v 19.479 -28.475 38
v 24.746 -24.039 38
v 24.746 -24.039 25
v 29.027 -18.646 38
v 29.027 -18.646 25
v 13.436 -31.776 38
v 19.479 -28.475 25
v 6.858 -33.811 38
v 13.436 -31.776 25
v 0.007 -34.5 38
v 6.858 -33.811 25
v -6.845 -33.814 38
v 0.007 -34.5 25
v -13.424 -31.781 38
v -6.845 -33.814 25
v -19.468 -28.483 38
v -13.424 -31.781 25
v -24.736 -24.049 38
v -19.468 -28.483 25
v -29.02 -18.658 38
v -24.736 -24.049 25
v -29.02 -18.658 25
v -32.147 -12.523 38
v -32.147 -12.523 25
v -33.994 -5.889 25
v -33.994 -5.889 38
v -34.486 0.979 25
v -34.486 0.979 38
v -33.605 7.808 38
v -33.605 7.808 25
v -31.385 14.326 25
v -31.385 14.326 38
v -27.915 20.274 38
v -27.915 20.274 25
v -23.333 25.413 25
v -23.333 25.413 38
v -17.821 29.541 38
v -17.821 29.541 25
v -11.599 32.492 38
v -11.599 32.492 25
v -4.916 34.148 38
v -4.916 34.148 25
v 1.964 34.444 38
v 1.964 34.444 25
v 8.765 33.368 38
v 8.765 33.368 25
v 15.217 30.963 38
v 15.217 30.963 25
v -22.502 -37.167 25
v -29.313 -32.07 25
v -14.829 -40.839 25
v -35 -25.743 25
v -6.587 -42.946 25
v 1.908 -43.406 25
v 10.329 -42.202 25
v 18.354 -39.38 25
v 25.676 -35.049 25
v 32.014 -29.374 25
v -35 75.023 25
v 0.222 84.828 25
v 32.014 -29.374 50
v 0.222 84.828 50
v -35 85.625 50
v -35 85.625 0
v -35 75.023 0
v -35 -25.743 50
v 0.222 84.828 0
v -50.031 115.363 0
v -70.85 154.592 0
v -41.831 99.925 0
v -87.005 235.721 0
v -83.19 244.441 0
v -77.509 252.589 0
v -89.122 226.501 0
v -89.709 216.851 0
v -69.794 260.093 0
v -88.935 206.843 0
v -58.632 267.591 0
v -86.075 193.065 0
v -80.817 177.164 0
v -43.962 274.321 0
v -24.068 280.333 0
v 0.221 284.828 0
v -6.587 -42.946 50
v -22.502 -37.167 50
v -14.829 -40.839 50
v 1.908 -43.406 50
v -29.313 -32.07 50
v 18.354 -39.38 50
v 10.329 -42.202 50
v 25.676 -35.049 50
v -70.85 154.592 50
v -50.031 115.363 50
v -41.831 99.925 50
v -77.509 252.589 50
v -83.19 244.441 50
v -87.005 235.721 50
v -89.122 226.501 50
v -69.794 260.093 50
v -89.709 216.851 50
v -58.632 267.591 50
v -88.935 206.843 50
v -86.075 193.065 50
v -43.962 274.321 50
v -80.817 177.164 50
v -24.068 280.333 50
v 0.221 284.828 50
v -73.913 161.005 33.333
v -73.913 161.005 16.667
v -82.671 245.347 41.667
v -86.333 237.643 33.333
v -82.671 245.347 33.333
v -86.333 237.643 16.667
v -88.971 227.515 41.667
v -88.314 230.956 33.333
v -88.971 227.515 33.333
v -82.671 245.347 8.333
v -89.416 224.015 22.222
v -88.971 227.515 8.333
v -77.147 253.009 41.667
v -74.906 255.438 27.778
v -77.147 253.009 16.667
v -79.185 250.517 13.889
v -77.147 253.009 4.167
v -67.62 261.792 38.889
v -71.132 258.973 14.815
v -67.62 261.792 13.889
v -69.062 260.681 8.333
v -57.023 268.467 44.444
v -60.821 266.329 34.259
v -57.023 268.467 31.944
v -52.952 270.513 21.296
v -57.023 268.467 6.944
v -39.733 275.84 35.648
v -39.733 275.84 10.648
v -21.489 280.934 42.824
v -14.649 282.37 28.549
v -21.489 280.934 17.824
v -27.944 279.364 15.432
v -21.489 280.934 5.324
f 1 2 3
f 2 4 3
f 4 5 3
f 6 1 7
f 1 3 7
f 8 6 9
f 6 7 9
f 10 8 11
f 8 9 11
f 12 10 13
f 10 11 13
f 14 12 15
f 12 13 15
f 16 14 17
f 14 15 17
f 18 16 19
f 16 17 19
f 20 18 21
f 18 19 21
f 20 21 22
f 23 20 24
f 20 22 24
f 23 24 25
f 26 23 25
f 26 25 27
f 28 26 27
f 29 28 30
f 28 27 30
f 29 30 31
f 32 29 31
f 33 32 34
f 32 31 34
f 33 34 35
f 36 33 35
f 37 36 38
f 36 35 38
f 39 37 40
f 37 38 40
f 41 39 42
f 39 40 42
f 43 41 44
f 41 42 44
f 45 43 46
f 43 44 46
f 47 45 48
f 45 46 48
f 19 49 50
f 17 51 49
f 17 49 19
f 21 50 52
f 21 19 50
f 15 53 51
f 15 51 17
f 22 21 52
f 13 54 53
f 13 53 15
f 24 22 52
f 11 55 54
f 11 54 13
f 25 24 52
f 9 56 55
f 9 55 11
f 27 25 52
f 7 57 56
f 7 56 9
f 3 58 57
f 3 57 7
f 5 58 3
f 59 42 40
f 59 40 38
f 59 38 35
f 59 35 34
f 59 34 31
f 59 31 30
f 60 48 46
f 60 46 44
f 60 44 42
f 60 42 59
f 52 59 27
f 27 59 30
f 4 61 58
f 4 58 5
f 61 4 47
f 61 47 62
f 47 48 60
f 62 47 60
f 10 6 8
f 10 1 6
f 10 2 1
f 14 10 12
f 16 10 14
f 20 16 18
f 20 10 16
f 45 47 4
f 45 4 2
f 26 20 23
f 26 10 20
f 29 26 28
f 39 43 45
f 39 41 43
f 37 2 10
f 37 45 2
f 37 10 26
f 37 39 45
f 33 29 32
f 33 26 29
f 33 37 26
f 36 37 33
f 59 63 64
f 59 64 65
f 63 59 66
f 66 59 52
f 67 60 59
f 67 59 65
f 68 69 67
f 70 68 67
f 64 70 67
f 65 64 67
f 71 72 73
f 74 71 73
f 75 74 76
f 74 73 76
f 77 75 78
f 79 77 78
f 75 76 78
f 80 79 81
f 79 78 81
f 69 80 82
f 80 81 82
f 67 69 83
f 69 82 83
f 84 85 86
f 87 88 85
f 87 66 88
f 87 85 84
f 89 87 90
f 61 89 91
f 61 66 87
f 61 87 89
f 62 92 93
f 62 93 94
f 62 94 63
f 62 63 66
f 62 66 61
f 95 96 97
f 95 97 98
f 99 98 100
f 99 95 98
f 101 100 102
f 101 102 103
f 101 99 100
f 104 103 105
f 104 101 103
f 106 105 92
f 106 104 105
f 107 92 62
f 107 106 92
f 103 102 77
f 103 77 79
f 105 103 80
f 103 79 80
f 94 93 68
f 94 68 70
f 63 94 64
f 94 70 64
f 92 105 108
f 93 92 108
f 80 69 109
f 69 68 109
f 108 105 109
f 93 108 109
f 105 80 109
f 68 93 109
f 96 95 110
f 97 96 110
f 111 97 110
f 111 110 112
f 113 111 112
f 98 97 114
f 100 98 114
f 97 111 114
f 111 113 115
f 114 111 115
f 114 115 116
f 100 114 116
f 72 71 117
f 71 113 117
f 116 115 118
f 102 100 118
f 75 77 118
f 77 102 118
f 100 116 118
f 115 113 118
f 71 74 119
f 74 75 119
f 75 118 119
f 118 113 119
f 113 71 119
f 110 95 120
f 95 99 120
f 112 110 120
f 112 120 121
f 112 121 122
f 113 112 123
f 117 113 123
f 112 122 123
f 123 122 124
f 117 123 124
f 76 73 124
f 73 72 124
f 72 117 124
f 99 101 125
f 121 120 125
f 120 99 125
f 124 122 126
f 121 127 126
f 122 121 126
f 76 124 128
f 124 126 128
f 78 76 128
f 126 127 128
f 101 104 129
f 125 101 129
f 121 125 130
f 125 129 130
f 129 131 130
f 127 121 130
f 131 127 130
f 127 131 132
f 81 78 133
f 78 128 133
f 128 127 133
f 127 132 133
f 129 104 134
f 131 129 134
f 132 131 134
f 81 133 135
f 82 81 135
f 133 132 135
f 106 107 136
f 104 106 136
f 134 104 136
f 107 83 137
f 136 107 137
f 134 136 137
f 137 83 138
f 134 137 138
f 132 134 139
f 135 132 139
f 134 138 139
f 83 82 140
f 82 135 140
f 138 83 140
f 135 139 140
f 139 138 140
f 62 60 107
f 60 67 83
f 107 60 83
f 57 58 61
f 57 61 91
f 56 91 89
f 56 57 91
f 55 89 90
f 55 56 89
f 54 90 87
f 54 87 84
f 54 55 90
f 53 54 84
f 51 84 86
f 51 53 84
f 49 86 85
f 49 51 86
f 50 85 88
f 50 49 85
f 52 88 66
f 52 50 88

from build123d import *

# Parameters (mm, degrees)
BOSS_EXTRUDE1_DEPTH = 50
SKETCH3_W           = 66.376369139
SKETCH3_H           = 188.96079622
CUT_EXTRUDE1_DEPTH  = 305.408240944
SKETCH4_R           = 34.5
CUT_EXTRUDE2_DEPTH  = 13
CUT_EXTRUDE3_DEPTH  = 300.667940806


with BuildPart() as part:
    # Sketch1 → Boss-Extrude1 (new body)
    with BuildSketch(Plane.XY):
        with BuildLine():
            Line((0.221790001, 84.828286355), (0.2207262, 284.828286352))
            add(Edge.make_bspline(
                [(0.2207262, 284.828286352), (-159.978737061, 262.606607754), (-63.000724603, 150.139017081), (-35, 85.625)],
                knots=[0, 0, 0, 0, 1, 1, 1, 1], degree=3))
            Line((-35, 85.625), (-35, -85.625))
            Line((-35, -85.625), (35, -85.625))
            Line((35, -85.625), (35, -40.1019375))
            Line((35, -40.1019375), (0.221790001, 84.828286355))
        make_face()
    extrude(amount=BOSS_EXTRUDE1_DEPTH)

    # Sketch3 → Cut-Extrude1 (cut, through all)
    with BuildSketch(Plane(origin=(22.122011617, 6.158349372, 0), x_dir=(0, 0, -1), z_dir=(0.9633678796634119, 0.2681833858254875, 0))):
        with Locations((8.18818457, -12.819032142)):
            Rectangle(SKETCH3_W, SKETCH3_H)
    extrude(amount=-CUT_EXTRUDE1_DEPTH, mode=Mode.SUBTRACT)

    # Sketch4 → Cut-Extrude2 (cut)
    with BuildSketch(Plane(origin=(0, 0, 25), x_dir=(-1, 0, 0), z_dir=(0, 0, -1))):
        Circle(SKETCH4_R)
    extrude(amount=-CUT_EXTRUDE2_DEPTH, mode=Mode.SUBTRACT)

    # Sketch5 → Cut-Extrude3 (cut, through all)
    with BuildSketch(Plane(origin=(0, 0, 25), x_dir=(-1, 0, 0), z_dir=(0, 0, -1))):
        with BuildLine():
            Line((35, -40.1019375), (35, -85.625))
            Line((35, -85.625), (-35, -85.625))
            Line((-35, -85.625), (-35, -40.1019375))
            Line((-35, -40.1019375), (-32.013551407, -29.374022196))
            ThreePointArc((-32.013551407, -29.374022196), (2.35071235, -43.384038598), (35, -25.742972899))
            Line((35, -25.742972899), (35, -40.1019375))
        make_face()
    extrude(amount=-CUT_EXTRUDE3_DEPTH, mode=Mode.SUBTRACT)


solid = part.part
